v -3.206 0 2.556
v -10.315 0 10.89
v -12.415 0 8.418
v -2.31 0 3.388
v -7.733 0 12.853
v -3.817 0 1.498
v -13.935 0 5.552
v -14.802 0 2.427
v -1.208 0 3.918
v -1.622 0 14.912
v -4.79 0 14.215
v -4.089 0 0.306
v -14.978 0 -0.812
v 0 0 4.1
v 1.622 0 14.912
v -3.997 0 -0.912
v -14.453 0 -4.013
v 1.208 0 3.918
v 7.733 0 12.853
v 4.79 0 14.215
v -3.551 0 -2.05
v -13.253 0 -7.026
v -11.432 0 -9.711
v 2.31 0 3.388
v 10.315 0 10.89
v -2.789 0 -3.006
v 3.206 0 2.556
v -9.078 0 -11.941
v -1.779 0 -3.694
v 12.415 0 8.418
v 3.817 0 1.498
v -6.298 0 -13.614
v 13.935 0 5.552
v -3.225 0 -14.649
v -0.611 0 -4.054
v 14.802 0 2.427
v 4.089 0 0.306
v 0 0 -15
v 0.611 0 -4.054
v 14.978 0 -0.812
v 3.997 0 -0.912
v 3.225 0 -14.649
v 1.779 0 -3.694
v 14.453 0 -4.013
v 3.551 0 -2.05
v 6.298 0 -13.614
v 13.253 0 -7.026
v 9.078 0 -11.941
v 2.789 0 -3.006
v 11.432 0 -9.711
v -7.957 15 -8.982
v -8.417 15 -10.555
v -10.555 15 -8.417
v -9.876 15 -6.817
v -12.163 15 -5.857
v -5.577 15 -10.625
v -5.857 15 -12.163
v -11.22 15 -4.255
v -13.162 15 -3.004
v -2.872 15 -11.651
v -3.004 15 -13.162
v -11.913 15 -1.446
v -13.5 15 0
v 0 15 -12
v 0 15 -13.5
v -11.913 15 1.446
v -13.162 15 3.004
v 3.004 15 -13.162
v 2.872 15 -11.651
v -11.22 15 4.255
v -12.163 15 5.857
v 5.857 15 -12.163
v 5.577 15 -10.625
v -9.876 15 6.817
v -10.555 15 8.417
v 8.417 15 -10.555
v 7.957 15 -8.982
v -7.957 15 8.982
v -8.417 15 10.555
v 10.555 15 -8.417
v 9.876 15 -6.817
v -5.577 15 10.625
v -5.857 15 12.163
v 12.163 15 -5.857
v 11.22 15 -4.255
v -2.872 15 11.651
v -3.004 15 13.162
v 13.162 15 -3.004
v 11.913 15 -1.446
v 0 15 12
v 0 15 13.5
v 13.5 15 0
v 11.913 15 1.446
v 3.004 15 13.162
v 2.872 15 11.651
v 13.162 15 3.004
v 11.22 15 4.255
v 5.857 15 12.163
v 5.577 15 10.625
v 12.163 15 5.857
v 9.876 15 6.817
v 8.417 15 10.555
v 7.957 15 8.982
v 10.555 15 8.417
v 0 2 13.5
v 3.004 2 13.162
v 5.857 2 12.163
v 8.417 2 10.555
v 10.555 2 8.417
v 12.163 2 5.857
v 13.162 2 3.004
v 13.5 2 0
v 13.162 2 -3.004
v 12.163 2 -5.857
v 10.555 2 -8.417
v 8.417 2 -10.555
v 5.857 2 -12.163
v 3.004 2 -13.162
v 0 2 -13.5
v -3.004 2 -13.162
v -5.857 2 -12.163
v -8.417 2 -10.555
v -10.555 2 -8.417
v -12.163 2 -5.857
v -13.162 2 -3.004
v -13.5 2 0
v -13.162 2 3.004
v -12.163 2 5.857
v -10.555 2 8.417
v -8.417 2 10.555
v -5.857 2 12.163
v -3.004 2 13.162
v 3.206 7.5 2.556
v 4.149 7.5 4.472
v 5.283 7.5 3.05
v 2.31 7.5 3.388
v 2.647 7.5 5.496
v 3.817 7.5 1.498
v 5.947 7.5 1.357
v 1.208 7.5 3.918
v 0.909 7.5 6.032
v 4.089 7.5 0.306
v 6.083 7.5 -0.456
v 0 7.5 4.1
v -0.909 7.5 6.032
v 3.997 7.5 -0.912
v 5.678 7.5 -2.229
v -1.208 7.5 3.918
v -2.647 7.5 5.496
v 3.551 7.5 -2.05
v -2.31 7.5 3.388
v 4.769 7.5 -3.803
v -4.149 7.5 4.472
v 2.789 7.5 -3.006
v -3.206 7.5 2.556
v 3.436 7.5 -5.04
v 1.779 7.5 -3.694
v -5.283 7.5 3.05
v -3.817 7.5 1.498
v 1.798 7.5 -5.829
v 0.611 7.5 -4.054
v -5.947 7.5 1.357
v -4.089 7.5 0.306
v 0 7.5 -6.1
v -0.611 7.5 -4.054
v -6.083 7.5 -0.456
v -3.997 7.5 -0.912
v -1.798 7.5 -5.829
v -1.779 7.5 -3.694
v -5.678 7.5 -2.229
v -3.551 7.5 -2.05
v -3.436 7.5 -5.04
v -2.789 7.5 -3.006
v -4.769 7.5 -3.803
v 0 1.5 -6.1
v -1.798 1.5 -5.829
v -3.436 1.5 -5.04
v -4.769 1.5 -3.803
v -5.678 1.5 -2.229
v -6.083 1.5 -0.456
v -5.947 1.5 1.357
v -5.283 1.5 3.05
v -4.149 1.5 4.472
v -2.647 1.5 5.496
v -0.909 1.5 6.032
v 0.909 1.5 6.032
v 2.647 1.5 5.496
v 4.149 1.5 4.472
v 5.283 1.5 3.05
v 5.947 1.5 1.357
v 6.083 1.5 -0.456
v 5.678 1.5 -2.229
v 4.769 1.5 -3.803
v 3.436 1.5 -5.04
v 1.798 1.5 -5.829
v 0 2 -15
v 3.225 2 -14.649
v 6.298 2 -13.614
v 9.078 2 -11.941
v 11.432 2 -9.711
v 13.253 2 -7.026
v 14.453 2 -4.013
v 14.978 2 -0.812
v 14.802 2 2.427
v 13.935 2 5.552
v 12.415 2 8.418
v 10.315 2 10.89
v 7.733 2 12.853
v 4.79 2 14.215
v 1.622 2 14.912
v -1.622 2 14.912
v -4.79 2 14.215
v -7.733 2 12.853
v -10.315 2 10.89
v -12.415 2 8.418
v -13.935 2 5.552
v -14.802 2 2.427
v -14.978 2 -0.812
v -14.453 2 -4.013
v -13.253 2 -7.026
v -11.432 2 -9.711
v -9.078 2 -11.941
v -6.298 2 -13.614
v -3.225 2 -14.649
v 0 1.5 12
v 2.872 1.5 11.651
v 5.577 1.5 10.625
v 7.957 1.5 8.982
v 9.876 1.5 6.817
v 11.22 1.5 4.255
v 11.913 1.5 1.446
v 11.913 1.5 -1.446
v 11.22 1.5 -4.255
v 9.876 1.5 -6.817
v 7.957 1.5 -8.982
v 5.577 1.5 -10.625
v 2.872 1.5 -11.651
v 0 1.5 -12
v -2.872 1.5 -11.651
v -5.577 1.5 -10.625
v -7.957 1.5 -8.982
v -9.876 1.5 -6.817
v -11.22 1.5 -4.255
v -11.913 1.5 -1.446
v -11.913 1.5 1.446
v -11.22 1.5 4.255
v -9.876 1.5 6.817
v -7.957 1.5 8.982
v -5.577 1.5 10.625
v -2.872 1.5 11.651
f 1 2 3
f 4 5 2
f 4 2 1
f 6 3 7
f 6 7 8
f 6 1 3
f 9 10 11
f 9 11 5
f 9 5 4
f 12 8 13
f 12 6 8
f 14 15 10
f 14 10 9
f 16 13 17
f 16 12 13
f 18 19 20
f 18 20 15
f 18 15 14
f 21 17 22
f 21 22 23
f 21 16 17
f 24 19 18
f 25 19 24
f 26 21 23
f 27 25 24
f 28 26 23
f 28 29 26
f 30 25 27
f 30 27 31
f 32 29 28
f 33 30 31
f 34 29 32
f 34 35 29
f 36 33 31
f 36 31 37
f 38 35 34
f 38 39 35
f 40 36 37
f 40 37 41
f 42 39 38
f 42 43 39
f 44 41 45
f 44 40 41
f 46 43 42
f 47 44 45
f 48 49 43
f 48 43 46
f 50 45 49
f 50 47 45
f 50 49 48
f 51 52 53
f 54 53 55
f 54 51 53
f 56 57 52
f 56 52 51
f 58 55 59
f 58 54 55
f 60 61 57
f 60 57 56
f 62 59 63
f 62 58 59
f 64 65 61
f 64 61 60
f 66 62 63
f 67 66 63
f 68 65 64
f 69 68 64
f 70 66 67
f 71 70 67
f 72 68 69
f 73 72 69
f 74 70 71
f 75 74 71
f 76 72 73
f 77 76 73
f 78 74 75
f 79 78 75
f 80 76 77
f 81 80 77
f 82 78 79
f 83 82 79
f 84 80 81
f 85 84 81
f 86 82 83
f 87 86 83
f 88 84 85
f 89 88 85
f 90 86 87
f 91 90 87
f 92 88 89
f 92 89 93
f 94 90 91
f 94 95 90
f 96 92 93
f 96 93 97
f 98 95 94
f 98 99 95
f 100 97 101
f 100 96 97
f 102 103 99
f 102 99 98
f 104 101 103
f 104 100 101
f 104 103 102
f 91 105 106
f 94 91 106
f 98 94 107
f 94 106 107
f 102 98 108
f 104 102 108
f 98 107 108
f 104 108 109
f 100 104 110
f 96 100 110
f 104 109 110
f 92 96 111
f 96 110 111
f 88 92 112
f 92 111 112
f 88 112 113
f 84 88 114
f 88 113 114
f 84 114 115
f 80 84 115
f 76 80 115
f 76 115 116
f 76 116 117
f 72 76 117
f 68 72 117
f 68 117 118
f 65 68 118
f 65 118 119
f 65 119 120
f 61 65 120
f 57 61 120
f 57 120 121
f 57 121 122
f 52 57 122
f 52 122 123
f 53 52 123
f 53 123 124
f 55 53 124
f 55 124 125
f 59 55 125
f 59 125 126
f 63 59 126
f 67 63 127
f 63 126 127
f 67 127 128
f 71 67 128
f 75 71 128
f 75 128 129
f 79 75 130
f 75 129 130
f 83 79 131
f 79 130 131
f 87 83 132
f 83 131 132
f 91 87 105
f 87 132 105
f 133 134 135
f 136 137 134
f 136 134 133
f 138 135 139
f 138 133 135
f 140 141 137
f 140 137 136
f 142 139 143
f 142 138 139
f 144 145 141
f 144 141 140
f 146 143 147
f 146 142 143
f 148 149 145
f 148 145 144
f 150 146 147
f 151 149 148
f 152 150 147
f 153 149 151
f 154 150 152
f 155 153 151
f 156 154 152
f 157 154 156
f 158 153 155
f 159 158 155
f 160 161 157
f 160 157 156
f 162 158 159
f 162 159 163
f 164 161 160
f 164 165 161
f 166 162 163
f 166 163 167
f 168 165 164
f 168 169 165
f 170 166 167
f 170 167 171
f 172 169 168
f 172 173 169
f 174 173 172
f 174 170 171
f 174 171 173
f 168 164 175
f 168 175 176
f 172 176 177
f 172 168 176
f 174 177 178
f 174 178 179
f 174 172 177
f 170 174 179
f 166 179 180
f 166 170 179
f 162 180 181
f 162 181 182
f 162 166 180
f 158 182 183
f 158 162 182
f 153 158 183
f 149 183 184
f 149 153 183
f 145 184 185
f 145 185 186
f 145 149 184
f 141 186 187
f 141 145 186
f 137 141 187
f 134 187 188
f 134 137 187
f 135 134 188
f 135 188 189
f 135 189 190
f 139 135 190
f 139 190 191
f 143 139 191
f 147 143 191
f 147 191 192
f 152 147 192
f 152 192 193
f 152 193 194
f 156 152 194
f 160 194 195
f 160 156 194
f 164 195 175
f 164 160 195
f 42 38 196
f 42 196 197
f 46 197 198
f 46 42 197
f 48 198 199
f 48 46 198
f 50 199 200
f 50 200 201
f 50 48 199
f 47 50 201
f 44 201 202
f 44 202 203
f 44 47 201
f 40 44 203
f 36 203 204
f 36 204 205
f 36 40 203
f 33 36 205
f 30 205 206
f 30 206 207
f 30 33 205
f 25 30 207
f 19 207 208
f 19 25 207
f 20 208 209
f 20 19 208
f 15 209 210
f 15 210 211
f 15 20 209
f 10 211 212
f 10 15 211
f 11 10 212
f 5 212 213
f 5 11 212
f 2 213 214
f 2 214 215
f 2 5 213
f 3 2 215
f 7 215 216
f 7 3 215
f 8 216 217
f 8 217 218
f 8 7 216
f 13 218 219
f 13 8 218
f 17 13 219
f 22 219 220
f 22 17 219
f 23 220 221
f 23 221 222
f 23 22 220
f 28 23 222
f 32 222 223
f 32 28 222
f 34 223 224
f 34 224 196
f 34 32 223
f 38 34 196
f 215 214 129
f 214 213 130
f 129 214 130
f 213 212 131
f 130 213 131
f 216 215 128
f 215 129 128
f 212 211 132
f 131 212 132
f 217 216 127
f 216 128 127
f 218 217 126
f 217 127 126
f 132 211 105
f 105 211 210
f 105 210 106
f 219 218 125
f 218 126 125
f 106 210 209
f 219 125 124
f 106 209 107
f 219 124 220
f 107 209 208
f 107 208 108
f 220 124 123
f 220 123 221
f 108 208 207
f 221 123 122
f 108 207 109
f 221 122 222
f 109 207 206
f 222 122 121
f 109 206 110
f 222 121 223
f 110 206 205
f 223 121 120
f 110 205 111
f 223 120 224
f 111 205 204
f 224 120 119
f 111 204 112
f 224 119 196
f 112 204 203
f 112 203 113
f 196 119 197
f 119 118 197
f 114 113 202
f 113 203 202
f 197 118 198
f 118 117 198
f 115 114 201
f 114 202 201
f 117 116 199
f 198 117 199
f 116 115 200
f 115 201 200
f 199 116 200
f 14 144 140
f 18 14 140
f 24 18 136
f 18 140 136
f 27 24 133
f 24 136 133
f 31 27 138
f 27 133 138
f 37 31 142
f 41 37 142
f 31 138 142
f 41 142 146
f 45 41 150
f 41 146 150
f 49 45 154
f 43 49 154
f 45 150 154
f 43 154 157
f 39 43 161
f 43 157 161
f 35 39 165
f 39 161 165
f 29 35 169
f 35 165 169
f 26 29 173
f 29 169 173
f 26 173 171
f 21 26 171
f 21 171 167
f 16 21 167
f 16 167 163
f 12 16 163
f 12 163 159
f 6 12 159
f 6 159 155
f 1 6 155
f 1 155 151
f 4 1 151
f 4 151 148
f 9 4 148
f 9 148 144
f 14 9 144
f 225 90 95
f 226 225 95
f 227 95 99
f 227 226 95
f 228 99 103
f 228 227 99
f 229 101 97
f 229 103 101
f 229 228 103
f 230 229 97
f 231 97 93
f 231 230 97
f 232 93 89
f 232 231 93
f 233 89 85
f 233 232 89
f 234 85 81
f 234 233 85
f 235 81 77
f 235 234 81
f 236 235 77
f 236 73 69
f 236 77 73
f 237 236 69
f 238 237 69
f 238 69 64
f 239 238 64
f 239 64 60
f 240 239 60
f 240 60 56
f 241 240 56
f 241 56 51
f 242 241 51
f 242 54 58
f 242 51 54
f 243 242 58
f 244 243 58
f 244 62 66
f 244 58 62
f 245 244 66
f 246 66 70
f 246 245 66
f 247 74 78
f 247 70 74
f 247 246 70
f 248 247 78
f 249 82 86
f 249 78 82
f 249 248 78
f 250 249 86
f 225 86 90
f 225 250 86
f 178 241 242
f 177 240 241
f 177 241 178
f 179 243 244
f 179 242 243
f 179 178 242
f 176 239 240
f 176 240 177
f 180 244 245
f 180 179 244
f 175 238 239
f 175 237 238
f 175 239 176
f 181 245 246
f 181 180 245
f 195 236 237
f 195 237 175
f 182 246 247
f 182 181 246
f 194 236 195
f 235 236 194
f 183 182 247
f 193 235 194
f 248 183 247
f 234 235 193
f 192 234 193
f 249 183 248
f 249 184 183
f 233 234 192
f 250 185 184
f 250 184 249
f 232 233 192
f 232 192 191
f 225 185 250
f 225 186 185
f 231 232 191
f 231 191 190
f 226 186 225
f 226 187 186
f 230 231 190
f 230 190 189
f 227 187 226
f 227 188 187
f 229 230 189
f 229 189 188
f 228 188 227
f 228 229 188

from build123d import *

# Parameters (mm, degrees)
SKETCH1_R           = 13.5
BOSS_EXTRUDE1_DEPTH = 15
SHELL1_T            = -1.5
SKETCH2_R           = 4.1
CUT_EXTRUDE1_DEPTH  = 20
BOSS_EXTRUDE2_START = 6
SKETCH3_R           = 6.1
SKETCH3_R_2         = 4.1
BOSS_EXTRUDE2_DEPTH = 6
SKETCH4_R           = 15
SKETCH4_R_2         = 12.5
BOSS_EXTRUDE3_DEPTH = 2


with BuildPart() as part:
    # Sketch1 → Boss-Extrude1 (new body)
    with BuildSketch(Plane(origin=(0, 0, 0), x_dir=(1, 0, 0), z_dir=(0, 1, 0))):
        with Locations(Location((0, 0, 0), (0, 0, 270))):
            Circle(SKETCH1_R)
    extrude(amount=BOSS_EXTRUDE1_DEPTH)

    # Shell1
    shell1_openings = [part.faces().sort_by_distance(p)[0] for p in [
        (0, 15, 0),
    ]]
    offset(amount=SHELL1_T, openings=shell1_openings, kind=Kind.INTERSECTION)

    # Sketch2 → Cut-Extrude1 (cut)
    with BuildSketch(Plane(origin=(0, 1.5, 0), x_dir=(1, 0, 0), z_dir=(0, 1, 0))):
        with Locations(Location((0, 0, 0), (0, 0, 270))):
            Circle(SKETCH2_R)
    extrude(amount=-CUT_EXTRUDE1_DEPTH, mode=Mode.SUBTRACT)

    # Sketch3 → Boss-Extrude2 (add)
    with BuildSketch(Plane(origin=(0, 1.5, 0), x_dir=(1, 0, 0), z_dir=(0, 1, 0)).offset(BOSS_EXTRUDE2_START)):
        with Locations(Location((0, 0, 0), (0, 0, 90))):
            Circle(SKETCH3_R)
        with Locations(Location((0, 0, 0), (0, 0, 270))):
            Circle(SKETCH3_R_2, mode=Mode.SUBTRACT)
    extrude(amount=-BOSS_EXTRUDE2_DEPTH)


with BuildPart() as body_2:
    # Sketch4 → Boss-Extrude3 (new body)
    with BuildSketch(Plane.XZ):
        with Locations(Location((0, 0, 0), (0, 0, 270))):
            Circle(SKETCH4_R)
        with Locations(Location((0, 0, 0), (0, 0, 270))):
            Circle(SKETCH4_R_2, mode=Mode.SUBTRACT)
    extrude(amount=-BOSS_EXTRUDE3_DEPTH)


with BuildPart() as part_1:
    add(part.part)

    # Combine1: union body 2
    add(body_2.part)


solid = part_1.part
